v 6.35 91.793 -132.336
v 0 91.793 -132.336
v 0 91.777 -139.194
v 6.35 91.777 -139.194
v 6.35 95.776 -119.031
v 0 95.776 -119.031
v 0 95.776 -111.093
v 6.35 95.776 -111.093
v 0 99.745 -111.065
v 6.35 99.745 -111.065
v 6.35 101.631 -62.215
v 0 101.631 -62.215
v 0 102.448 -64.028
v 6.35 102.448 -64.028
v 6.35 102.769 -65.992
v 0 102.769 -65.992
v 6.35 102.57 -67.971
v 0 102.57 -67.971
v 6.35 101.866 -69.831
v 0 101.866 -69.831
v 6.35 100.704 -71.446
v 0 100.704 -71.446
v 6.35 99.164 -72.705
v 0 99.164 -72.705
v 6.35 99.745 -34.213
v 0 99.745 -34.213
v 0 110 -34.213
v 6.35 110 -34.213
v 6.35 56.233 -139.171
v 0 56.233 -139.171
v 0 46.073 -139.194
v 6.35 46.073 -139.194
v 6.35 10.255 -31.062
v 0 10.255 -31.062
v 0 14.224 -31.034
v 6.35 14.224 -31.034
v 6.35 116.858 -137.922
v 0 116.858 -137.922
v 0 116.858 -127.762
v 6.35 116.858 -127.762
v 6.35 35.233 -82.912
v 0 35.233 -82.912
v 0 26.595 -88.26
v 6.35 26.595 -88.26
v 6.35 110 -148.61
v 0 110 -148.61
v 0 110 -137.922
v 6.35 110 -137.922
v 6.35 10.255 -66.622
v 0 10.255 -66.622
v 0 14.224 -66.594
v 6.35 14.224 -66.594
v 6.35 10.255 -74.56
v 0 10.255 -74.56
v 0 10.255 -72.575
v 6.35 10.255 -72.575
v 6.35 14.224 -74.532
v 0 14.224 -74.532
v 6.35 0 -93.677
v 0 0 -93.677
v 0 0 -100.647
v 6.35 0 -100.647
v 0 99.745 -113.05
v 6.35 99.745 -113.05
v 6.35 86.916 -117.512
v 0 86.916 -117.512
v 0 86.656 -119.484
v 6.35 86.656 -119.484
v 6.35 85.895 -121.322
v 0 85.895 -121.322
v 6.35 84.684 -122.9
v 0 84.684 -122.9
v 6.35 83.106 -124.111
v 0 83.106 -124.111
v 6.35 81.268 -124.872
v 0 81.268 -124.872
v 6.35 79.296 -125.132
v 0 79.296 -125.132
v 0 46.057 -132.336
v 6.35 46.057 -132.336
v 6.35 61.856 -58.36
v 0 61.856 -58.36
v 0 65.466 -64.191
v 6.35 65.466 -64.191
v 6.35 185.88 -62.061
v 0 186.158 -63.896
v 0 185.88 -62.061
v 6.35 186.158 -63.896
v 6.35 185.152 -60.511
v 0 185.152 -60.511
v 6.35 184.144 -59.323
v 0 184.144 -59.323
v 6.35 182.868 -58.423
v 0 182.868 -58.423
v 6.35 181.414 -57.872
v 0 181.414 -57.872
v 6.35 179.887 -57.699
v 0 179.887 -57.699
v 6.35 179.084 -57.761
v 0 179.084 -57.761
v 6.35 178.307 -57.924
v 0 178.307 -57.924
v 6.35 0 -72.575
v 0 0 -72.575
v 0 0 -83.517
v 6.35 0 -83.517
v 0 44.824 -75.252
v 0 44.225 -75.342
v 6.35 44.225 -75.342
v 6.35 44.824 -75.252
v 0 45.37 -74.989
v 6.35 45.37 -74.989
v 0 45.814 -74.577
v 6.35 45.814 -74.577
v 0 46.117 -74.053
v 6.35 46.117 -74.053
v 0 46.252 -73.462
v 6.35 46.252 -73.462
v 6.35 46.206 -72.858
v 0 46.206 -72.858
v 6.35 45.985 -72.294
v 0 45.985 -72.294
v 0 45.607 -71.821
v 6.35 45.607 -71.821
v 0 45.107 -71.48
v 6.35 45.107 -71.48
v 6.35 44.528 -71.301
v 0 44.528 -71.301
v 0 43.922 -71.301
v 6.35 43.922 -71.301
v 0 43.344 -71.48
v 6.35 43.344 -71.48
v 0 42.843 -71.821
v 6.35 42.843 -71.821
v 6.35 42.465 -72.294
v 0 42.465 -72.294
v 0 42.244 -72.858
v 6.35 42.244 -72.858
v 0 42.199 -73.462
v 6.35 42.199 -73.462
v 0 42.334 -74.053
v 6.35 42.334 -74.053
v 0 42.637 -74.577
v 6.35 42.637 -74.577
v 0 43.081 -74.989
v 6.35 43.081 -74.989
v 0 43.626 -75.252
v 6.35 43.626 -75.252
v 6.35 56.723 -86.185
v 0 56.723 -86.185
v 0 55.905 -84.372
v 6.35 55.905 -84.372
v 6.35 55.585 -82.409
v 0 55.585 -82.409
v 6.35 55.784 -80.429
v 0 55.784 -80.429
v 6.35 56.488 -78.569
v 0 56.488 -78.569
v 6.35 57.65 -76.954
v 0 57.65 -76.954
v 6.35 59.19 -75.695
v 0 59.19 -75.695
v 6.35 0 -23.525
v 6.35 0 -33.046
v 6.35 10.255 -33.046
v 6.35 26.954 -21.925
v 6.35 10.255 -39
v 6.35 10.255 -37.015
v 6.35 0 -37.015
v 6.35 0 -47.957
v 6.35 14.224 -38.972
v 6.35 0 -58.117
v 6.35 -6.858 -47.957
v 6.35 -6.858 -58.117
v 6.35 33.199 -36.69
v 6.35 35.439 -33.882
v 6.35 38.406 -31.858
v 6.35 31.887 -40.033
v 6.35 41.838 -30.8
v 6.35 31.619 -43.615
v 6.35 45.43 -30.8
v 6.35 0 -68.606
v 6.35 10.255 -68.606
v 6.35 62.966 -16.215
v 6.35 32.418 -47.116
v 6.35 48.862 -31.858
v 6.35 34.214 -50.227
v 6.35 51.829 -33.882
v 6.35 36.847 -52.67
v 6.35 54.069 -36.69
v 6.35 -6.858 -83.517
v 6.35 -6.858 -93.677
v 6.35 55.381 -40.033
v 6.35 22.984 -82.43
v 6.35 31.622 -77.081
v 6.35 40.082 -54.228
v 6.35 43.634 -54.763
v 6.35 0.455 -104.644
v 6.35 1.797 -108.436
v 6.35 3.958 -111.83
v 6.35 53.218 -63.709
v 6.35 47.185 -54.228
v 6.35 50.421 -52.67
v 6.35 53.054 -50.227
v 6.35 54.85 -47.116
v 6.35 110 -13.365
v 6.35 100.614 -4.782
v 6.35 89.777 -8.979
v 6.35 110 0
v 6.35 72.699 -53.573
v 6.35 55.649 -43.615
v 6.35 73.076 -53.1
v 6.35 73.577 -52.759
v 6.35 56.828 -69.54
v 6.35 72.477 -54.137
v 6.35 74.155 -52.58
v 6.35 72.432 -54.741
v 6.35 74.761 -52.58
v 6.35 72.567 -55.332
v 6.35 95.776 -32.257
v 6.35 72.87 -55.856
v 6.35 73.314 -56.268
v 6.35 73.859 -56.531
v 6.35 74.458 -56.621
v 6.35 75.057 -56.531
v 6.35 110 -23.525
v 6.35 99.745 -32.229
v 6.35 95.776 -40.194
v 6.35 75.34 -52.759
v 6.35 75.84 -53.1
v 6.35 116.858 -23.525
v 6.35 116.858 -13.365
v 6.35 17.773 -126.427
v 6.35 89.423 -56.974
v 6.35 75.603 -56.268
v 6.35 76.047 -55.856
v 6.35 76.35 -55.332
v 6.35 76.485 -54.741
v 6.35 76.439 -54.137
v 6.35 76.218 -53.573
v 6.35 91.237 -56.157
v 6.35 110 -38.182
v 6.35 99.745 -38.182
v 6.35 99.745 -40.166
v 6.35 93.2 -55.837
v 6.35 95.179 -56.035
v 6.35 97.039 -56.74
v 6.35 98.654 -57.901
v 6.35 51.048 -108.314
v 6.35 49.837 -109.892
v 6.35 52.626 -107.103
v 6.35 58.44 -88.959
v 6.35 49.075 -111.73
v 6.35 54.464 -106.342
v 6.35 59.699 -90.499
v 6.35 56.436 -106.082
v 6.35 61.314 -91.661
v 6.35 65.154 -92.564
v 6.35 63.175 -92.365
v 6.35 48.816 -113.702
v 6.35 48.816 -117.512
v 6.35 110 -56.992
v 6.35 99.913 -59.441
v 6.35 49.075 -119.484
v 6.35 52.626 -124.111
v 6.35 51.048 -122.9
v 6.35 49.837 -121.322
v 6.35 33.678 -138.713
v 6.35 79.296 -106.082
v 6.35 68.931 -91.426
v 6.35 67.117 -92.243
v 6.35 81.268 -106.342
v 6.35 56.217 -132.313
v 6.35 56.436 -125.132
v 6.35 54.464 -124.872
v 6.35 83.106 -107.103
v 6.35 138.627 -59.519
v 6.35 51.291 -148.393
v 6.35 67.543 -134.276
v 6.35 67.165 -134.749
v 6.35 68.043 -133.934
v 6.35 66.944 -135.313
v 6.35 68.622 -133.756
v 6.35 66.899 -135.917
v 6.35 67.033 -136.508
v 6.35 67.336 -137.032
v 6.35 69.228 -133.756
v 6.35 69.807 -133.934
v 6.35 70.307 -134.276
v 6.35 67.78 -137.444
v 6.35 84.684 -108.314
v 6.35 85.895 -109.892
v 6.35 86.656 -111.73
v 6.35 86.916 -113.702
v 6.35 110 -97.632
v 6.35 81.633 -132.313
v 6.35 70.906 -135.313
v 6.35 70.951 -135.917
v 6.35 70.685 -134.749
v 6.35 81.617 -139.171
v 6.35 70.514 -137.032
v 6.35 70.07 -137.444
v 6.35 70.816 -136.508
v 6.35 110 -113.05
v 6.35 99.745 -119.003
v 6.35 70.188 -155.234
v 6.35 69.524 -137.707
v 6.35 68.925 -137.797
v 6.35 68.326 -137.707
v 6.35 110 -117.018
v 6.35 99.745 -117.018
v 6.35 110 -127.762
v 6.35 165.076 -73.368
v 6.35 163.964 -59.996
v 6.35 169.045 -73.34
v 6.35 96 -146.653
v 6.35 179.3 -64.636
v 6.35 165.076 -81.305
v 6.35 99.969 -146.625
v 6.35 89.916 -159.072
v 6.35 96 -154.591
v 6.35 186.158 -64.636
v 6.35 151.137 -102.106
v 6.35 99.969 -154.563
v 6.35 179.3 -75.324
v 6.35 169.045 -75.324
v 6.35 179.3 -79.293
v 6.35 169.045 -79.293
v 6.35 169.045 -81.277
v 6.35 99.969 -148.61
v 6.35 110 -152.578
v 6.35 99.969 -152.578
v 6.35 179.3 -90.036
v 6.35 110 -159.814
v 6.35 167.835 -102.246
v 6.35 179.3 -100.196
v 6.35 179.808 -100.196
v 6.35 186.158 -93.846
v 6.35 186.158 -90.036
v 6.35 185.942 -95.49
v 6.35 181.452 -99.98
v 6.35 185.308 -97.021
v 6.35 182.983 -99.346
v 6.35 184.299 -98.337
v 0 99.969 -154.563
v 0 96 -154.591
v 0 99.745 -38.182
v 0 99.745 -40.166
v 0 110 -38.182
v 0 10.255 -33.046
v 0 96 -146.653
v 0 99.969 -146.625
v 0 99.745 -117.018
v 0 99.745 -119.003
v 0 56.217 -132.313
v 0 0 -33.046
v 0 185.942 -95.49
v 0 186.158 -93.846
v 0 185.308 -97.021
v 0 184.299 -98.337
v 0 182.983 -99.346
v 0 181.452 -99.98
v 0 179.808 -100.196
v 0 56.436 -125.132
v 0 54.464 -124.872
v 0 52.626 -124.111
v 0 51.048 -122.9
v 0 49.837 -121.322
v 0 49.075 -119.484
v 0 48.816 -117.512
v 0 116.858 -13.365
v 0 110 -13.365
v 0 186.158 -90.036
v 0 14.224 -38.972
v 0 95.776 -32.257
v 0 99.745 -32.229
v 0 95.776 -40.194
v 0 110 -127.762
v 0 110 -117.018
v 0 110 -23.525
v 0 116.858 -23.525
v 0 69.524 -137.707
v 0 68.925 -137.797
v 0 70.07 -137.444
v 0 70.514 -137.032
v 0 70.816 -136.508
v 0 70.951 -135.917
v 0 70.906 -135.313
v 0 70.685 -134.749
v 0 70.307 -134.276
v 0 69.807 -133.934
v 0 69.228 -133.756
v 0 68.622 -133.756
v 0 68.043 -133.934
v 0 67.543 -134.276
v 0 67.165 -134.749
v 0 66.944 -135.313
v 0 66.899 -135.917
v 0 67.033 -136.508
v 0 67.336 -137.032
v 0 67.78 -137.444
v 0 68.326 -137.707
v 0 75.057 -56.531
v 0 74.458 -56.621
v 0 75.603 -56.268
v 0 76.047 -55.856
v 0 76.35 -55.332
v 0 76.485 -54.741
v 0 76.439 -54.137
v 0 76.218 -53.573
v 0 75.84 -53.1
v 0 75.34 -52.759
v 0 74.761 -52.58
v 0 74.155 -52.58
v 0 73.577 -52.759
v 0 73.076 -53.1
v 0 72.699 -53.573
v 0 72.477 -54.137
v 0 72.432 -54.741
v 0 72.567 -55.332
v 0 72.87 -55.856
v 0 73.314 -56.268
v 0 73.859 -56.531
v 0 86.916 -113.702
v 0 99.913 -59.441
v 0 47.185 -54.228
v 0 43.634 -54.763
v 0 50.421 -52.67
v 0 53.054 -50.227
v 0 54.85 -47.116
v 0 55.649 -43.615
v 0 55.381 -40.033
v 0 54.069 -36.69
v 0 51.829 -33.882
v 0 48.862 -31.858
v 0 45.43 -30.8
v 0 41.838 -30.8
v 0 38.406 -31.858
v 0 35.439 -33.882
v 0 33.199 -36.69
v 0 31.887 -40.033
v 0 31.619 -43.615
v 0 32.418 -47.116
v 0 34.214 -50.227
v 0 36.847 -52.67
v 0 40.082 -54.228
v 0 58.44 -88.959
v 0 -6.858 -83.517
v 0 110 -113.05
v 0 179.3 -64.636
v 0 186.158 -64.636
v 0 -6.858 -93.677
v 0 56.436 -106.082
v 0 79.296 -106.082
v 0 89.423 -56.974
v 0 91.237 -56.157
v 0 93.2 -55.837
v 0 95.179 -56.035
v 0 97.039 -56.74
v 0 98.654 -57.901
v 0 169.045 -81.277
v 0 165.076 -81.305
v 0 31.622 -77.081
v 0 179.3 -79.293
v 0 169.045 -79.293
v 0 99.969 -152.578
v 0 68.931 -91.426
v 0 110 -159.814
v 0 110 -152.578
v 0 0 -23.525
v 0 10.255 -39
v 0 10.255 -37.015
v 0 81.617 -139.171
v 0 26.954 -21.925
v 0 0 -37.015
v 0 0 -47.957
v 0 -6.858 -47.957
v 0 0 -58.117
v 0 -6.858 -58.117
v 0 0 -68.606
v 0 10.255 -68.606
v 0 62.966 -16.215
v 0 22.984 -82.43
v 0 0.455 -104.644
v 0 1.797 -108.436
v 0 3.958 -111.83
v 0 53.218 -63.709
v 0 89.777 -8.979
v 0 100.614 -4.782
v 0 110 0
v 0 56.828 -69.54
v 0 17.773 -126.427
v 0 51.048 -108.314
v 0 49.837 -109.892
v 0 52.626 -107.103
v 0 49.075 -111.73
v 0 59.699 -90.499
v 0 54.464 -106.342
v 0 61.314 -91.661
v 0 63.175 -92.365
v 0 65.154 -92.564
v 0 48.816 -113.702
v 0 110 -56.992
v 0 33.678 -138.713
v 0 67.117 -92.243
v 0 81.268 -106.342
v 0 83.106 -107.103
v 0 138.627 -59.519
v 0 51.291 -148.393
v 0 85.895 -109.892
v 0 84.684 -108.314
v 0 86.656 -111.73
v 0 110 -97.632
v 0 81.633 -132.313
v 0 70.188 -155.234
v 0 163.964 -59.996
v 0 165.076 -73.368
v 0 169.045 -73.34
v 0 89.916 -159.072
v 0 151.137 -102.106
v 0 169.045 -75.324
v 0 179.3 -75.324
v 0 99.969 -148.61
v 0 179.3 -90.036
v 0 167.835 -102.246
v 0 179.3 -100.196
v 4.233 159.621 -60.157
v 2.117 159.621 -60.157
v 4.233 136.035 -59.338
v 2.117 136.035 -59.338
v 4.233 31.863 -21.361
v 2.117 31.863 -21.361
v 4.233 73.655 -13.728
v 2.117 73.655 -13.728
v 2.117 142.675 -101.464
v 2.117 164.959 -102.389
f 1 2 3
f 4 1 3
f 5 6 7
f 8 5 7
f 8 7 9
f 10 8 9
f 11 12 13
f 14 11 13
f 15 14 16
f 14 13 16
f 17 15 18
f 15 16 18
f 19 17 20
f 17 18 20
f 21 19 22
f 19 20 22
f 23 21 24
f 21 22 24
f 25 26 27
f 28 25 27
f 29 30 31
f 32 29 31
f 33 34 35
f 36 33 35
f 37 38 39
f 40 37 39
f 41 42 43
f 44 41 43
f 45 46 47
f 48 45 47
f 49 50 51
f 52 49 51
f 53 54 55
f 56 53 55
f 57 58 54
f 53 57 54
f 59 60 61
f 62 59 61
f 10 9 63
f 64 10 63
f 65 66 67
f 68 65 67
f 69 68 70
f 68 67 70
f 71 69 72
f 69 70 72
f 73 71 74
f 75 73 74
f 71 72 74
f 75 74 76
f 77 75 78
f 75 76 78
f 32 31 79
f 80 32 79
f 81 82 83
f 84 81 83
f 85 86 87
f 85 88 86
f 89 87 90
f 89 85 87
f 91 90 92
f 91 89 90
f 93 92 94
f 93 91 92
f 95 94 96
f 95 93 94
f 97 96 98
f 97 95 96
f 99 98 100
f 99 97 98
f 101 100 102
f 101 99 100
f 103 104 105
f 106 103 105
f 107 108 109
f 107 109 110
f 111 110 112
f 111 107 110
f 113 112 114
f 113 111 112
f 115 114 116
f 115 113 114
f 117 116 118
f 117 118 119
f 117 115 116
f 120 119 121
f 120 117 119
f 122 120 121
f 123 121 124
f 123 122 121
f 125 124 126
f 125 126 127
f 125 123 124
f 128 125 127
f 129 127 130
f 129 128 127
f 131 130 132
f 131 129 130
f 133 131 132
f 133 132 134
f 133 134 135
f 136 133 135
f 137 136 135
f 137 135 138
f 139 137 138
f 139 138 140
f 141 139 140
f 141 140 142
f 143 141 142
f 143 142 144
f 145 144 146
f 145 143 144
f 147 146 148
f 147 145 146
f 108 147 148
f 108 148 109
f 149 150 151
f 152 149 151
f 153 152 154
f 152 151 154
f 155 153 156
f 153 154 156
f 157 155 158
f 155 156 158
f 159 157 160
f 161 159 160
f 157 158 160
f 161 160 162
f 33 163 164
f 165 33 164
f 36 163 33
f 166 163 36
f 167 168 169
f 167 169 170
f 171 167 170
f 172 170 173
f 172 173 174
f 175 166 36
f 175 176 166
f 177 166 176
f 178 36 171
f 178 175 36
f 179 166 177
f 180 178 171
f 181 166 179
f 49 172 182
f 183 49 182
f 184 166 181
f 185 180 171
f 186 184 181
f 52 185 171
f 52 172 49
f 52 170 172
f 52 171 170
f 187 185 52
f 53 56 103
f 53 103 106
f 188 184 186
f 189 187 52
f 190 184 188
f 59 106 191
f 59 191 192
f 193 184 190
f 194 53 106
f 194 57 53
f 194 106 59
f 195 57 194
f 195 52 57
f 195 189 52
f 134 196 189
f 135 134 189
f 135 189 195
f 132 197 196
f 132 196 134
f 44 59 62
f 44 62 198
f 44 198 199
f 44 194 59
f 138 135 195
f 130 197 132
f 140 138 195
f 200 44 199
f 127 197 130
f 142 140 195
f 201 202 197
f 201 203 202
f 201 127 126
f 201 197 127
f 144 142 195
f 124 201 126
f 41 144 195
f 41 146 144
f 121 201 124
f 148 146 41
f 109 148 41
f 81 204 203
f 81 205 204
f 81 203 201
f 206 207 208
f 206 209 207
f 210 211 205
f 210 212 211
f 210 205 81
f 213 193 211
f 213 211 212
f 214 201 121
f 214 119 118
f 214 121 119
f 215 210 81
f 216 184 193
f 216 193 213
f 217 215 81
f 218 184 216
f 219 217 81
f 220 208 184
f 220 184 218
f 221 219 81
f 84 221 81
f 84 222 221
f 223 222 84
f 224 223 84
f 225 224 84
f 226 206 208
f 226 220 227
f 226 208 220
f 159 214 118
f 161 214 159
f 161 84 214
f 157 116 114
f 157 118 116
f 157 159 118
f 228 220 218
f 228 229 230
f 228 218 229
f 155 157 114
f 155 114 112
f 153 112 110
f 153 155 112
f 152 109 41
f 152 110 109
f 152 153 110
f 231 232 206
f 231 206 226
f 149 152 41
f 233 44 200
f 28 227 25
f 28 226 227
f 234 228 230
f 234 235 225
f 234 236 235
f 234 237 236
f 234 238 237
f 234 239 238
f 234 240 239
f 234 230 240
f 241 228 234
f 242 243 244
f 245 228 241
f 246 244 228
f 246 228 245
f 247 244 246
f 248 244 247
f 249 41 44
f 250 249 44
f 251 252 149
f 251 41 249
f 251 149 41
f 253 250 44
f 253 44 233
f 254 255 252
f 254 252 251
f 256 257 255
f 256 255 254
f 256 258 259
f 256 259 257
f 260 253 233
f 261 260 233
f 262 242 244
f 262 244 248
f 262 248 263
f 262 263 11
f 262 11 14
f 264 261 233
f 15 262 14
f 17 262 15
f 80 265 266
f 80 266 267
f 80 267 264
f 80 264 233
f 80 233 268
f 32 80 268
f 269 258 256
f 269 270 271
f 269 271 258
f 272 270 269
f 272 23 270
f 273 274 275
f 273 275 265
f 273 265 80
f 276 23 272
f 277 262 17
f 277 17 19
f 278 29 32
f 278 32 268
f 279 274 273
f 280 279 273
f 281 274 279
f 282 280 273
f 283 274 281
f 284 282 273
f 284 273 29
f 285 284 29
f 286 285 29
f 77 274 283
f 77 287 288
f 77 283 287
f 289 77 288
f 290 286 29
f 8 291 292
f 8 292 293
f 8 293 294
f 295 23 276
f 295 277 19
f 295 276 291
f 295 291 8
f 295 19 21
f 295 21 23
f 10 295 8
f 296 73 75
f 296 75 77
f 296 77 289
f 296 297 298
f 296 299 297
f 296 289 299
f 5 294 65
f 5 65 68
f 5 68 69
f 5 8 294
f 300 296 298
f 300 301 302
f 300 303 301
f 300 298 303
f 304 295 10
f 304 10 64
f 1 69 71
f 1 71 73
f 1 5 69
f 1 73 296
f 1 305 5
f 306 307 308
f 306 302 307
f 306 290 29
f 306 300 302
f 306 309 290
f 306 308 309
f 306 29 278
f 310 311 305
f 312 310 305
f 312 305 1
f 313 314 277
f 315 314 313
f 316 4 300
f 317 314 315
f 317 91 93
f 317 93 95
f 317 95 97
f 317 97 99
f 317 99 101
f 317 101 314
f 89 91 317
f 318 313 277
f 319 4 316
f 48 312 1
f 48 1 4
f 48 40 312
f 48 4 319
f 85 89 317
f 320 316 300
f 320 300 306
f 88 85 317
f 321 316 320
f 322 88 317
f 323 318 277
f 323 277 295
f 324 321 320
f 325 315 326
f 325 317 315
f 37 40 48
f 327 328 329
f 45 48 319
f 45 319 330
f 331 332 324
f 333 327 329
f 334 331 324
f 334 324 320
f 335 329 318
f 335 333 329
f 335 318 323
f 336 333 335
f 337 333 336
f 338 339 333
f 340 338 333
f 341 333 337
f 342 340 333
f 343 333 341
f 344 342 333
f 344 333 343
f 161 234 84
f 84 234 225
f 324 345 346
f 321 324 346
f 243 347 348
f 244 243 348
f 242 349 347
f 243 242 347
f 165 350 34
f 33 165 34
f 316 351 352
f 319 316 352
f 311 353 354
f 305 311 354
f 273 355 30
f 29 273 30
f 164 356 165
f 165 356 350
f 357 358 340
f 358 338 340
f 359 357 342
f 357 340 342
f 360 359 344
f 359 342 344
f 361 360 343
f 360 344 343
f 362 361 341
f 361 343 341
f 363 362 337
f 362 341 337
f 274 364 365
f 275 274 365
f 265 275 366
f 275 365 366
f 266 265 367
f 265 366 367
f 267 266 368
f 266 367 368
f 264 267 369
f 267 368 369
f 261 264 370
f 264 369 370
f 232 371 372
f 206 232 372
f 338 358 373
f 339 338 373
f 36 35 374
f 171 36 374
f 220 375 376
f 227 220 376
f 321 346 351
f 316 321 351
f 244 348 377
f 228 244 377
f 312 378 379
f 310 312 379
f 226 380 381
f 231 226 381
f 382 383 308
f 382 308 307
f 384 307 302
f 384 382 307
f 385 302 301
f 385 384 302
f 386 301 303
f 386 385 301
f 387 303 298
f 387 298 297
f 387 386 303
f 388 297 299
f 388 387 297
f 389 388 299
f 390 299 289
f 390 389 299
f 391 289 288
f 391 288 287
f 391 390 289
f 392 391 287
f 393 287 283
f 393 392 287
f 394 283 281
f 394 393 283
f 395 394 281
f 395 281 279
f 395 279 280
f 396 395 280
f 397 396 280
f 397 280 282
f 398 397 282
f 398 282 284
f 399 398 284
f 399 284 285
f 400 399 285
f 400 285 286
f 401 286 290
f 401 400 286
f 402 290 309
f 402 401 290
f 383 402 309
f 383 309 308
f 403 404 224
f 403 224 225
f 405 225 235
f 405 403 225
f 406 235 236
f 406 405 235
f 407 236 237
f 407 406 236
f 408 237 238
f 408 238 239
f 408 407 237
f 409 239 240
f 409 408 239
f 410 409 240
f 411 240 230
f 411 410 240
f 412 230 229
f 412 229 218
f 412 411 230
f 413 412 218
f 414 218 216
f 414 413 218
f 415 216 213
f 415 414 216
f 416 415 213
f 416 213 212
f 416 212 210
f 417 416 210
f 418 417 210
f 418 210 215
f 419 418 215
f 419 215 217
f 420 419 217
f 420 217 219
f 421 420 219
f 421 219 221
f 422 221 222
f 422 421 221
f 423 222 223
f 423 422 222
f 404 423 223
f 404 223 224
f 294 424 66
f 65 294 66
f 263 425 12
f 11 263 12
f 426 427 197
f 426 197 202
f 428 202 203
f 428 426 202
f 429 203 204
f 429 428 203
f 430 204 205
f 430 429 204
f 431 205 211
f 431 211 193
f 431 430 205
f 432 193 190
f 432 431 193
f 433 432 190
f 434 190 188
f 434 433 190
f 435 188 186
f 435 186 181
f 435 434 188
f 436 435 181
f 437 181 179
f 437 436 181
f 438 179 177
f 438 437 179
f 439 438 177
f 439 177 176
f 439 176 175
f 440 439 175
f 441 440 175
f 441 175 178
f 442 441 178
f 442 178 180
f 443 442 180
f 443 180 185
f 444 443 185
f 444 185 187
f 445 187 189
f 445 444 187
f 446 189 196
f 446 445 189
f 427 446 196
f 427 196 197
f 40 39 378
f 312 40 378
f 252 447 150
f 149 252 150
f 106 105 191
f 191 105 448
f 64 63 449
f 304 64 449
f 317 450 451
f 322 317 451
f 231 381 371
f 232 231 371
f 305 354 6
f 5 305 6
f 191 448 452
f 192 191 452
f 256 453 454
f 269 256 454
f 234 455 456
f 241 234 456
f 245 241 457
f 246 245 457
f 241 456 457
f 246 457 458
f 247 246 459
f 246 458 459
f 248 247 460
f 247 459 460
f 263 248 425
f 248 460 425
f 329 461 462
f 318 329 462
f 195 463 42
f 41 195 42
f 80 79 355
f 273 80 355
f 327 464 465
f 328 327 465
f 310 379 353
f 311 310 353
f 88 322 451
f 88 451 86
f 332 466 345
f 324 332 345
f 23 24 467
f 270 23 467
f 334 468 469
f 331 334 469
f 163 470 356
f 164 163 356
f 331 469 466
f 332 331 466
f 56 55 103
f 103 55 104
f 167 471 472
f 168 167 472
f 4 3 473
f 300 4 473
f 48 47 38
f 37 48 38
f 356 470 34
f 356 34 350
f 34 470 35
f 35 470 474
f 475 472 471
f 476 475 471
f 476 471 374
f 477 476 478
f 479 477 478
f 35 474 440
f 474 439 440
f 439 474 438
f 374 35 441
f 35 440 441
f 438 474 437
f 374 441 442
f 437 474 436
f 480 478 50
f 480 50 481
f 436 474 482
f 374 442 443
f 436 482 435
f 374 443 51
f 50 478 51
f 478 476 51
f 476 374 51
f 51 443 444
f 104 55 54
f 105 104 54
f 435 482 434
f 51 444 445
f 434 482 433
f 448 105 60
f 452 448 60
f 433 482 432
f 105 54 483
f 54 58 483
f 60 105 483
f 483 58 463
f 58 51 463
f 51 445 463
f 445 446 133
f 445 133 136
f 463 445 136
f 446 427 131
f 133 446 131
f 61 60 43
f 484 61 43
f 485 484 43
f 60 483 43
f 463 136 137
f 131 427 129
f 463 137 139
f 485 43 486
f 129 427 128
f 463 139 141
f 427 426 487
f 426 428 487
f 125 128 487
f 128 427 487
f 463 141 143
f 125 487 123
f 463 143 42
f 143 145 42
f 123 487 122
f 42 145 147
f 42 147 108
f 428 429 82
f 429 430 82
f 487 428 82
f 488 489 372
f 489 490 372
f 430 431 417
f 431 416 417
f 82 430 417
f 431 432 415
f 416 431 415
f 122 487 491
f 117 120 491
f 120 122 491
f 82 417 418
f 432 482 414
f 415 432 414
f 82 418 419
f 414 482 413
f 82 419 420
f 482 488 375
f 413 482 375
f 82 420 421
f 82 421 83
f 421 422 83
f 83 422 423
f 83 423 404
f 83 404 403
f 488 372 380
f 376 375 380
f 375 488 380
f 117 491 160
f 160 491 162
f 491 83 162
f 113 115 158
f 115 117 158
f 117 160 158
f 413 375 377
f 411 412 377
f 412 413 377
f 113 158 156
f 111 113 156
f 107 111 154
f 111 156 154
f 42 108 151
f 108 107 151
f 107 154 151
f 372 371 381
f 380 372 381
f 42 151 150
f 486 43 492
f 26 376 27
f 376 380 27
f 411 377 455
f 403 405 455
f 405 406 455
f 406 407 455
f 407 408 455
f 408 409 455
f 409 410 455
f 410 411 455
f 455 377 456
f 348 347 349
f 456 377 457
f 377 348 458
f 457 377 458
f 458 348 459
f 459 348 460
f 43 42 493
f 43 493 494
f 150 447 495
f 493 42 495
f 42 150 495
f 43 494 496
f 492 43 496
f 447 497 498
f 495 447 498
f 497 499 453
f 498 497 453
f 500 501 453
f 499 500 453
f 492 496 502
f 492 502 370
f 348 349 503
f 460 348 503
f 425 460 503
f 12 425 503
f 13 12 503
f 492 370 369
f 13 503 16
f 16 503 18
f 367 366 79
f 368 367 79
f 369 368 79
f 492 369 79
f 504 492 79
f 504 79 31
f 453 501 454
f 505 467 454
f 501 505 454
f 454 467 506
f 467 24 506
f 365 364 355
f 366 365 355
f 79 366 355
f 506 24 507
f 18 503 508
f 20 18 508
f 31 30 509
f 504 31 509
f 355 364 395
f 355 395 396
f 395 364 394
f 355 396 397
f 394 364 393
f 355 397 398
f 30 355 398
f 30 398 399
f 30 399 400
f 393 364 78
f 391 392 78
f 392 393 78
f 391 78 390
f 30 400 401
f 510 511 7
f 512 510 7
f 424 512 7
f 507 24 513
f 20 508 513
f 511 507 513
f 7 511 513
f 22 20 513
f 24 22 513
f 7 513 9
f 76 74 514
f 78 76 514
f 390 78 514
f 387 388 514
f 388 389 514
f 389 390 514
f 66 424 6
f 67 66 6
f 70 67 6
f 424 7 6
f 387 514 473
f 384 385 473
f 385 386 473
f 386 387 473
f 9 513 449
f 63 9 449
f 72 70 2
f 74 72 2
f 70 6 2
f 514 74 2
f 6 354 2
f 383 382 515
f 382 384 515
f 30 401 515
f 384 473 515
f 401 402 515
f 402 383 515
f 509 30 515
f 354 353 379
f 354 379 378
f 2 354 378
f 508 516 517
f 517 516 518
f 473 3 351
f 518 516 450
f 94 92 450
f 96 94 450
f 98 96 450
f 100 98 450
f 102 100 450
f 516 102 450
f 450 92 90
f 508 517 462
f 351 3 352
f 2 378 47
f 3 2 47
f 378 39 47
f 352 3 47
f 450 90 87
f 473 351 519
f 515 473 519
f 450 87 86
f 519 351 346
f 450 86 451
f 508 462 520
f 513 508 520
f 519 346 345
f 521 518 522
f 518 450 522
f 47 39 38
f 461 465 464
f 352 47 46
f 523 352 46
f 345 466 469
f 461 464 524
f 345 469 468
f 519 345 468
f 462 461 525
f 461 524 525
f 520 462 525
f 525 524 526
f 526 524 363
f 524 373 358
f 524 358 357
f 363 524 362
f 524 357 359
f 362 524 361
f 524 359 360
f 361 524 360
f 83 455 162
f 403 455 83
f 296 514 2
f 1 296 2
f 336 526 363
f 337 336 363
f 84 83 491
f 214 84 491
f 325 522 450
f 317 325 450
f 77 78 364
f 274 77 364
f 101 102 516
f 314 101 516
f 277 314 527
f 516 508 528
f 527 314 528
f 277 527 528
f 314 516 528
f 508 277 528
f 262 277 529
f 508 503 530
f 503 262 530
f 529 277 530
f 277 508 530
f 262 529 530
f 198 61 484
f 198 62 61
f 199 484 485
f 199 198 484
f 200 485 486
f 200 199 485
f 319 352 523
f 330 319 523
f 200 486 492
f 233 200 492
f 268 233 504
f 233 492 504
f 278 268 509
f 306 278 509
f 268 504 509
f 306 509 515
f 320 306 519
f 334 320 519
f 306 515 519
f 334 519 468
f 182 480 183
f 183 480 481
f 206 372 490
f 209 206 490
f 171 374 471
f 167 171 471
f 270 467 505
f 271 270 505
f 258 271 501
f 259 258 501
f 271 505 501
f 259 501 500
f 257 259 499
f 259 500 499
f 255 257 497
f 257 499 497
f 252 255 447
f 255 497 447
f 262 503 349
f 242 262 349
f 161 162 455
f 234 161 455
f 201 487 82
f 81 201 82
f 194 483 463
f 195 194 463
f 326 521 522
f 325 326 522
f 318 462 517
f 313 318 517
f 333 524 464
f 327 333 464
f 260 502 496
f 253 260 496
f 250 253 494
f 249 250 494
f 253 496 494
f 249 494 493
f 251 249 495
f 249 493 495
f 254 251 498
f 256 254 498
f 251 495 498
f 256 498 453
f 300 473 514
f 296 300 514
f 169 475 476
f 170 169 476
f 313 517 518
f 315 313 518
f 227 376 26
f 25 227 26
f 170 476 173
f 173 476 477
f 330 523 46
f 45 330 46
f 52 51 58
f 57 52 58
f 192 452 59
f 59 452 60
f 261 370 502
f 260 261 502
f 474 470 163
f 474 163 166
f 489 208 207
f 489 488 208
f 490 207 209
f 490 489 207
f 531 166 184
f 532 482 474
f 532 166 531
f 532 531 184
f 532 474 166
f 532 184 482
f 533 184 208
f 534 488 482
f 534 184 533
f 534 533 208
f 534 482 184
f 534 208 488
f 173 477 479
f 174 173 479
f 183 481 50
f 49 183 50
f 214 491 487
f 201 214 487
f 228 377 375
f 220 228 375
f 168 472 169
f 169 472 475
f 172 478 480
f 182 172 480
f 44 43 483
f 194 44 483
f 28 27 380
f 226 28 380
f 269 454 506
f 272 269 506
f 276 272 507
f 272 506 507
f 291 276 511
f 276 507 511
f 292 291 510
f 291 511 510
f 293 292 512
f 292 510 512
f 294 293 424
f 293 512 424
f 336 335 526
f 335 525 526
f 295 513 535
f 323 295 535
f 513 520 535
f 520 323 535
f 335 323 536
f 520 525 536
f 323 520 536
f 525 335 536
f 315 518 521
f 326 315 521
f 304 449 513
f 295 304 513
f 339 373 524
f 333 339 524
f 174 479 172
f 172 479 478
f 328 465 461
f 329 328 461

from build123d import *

# Parameters (mm, degrees)
SKETCH1_R      = 12.049005967
SKETCH1_R_2    = 2.032
EXTRUDE1_DEPTH = 6.35
FILLET3_R      = 17.78
FILLET8_R      = 6.1976
FILLET10_R     = 6.35


with BuildPart() as part:
    # Sketch1 → Extrude1 (new body)
    with BuildSketch(Plane(origin=(0, 0, 0), x_dir=(0, 0, -1), z_dir=(1, 0, 0))):
        with BuildLine():
            Line((13.365344838, 110), (0, 110))
            add(Edge.make_bspline(
                [(23.525344838, 0), (23.886396453, 21.77280911), (16.984017385, 81.503501161), (0, 110)],
                knots=[0, 0, 0, 0, 1, 1, 1, 1], degree=3))
            Line((23.525344838, 0), (33.046497245, 0))
            Line((33.046497245, 0), (33.046497245, 10.25525))
            Line((33.046497245, 10.25525), (31.062122245, 10.25525))
            Line((31.062122245, 10.25525), (31.034086884, 14.224))
            Line((31.034086884, 14.224), (38.971586884, 14.224))
            Line((38.971586884, 14.224), (38.999622245, 10.25525))
            Line((38.999622245, 10.25525), (37.015247245, 10.25525))
            Line((37.015247245, 10.25525), (37.015247245, 0))
            Line((37.015247245, 0), (47.956836884, 0))
            Line((47.956836884, 0), (47.956836884, -6.858))
            Line((47.956836884, -6.858), (58.116836884, -6.858))
            Line((58.116836884, -6.858), (58.116836884, 0))
            Line((58.116836884, 0), (68.606497245, 0))
            Line((68.606497245, 0), (68.606497245, 10.25525))
            Line((68.606497245, 10.25525), (66.622122245, 10.25525))
            Line((66.622122245, 10.25525), (66.594086884, 14.224))
            Line((66.594086884, 14.224), (74.531586884, 14.224))
            Line((74.531586884, 14.224), (74.559622245, 10.25525))
            Line((74.559622245, 10.25525), (72.575247245, 10.25525))
            Line((72.575247245, 10.25525), (72.575247245, 0))
            Line((72.575247245, 0), (83.516836884, 0))
            Line((83.516836884, 0), (83.516836884, -6.858))
            Line((83.516836884, -6.858), (93.676836884, -6.858))
            Line((93.676836884, -6.858), (93.676836884, 0))
            Line((93.676836884, 0), (106.68, 0))
            ThreePointArc((106.68, 0), (147.01715629, 48.348482811), (159.813733796, 110))
            Line((159.813733796, 110), (152.578339639, 110))
            Line((152.578339639, 110), (152.578339639, 99.96875))
            Line((152.578339639, 99.96875), (154.562714639, 99.96875))
            Line((154.562714639, 99.96875), (154.59075, 96))
            Line((154.59075, 96), (146.65325, 96))
            Line((146.65325, 96), (146.625214639, 99.96875))
            Line((146.625214639, 99.96875), (148.609589639, 99.96875))
            Line((148.609589639, 99.96875), (148.609589639, 110))
            Line((148.609589639, 110), (137.922, 110))
            Line((137.922, 110), (137.922, 116.858))
            Line((137.922, 116.858), (127.762, 116.858))
            Line((127.762, 116.858), (127.762, 110))
            Line((127.762, 110), (117.018339639, 110))
            Line((117.018339639, 110), (117.018339639, 99.74475))
            Line((117.018339639, 99.74475), (119.002714639, 99.74475))
            Line((119.002714639, 99.74475), (119.03075, 95.776))
            Line((119.03075, 95.776), (111.09325, 95.776))
            Line((111.09325, 95.776), (111.065214639, 99.74475))
            Line((111.065214639, 99.74475), (113.049589639, 99.74475))
            Line((113.049589639, 99.74475), (113.049589639, 110))
            Line((113.049589639, 110), (97.632376997, 110))
            add(Edge.make_bspline(
                [(97.632376997, 110), (102.845891428, 148.686045998), (104.019096982, 168.115161248), (100.196457803, 179.300454229)],
                knots=[0.263690297, 0.263690297, 0.263690297, 0.263690297, 1, 1, 1, 1], degree=3))
            Line((100.196457803, 179.300454229), (100.196457803, 186.158454229))
            Line((100.196457803, 186.158454229), (90.036457803, 186.158454229))
            Line((90.036457803, 186.158454229), (90.036457803, 179.300454229))
            Line((90.036457803, 179.300454229), (79.292797442, 179.300454229))
            Line((79.292797442, 179.300454229), (79.292797442, 169.045204229))
            Line((79.292797442, 169.045204229), (81.277172442, 169.045204229))
            Line((81.277172442, 169.045204229), (81.305207803, 165.076454229))
            Line((81.305207803, 165.076454229), (73.367707803, 165.076454229))
            Line((73.367707803, 165.076454229), (73.339672442, 169.045204229))
            Line((73.339672442, 169.045204229), (75.324047442, 169.045204229))
            Line((75.324047442, 169.045204229), (75.324047442, 179.300454229))
            Line((75.324047442, 179.300454229), (64.636457803, 179.300454229))
            Line((64.636457803, 179.300454229), (64.636457803, 186.158454229))
            Line((64.636457803, 186.158454229), (54.476457803, 186.158454229))
            add(Edge.make_bspline(
                [(54.476457803, 186.158454229), (63.233505027, 173.481312137), (60.112941012, 141.740656068), (56.992376997, 110)],
                knots=[0, 0, 0, 0, 1, 1, 1, 1], degree=3))
            Line((56.992376997, 110), (38.181684477, 110))
            Line((38.181684477, 110), (38.181684477, 99.74475))
            Line((38.181684477, 99.74475), (40.166059477, 99.74475))
            Line((40.166059477, 99.74475), (40.194094838, 95.776))
            Line((40.194094838, 95.776), (32.256594838, 95.776))
            Line((32.256594838, 95.776), (32.228559477, 99.74475))
            Line((32.228559477, 99.74475), (34.212934477, 99.74475))
            Line((34.212934477, 99.74475), (34.212934477, 110))
            Line((34.212934477, 110), (23.525344838, 110))
            Line((23.525344838, 110), (23.525344838, 116.858))
            Line((23.525344838, 116.858), (13.365344838, 116.858))
            Line((13.365344838, 116.858), (13.365344838, 110))
        make_face()
        Polygon((77.081007641, 31.622417606), (82.911687358, 35.23286606), (88.260499882, 26.594822035), (82.429820165, 22.984373581), align=None, mode=Mode.SUBTRACT)
        with Locations((42.714261702, 43.633986225)):
            Circle(SKETCH1_R, mode=Mode.SUBTRACT)
        with Locations((73.310331844, 44.225196864)):
            Circle(SKETCH1_R_2, mode=Mode.SUBTRACT)
        Polygon((139.194257476, 46.072756303), (132.336275936, 46.056844127), (132.312702342, 56.216816779), (139.170683882, 56.232728955), align=None, mode=Mode.SUBTRACT)
        Polygon((58.360163805, 61.855571693), (64.190843522, 65.466020147), (69.539656047, 56.827976122), (63.70897633, 53.217527668), align=None, mode=Mode.SUBTRACT)
        with BuildLine():
            ThreePointArc((106.081947056, 79.295723893), (108.313793383, 84.683877565), (113.701947056, 86.915723893))
            Line((113.701947056, 86.915723893), (117.511947056, 86.915723893))
            ThreePointArc((117.511947056, 86.915723893), (122.900100729, 84.683877565), (125.131947056, 79.295723893))
            Line((125.131947056, 79.295723893), (125.131947056, 56.435723893))
            ThreePointArc((125.131947056, 56.435723893), (122.900100729, 51.04757022), (117.511947056, 48.815723893))
            Line((117.511947056, 48.815723893), (113.701947056, 48.815723893))
            ThreePointArc((113.701947056, 48.815723893), (108.313793383, 51.04757022), (106.081947056, 56.435723893))
            Line((106.081947056, 56.435723893), (106.081947056, 79.295723893))
        make_face(mode=Mode.SUBTRACT)
        with Locations((54.589488008, 74.458350952)):
            Circle(SKETCH1_R_2, mode=Mode.SUBTRACT)
        with Locations((135.765266706, 68.924861749)):
            Circle(SKETCH1_R_2, mode=Mode.SUBTRACT)
        with BuildLine():
            ThreePointArc((56.974437356, 89.423104749), (56.03531954, 95.179092566), (59.441360982, 99.913247161))
            Line((59.441360982, 99.913247161), (62.214897914, 101.630664789))
            ThreePointArc((62.214897914, 101.630664789), (67.970885731, 102.569782605), (72.705040326, 99.163741163))
            Line((72.705040326, 99.163741163), (91.425884161, 68.930587076))
            ThreePointArc((91.425884161, 68.930587076), (92.365001978, 63.174599258), (88.958960536, 58.440444664))
            Line((88.958960536, 58.440444664), (86.185423604, 56.723027036))
            ThreePointArc((86.185423604, 56.723027036), (80.429435786, 55.783909219), (75.695281192, 59.189950661))
            Line((75.695281192, 59.189950661), (56.974437356, 89.423104749))
        make_face(mode=Mode.SUBTRACT)
        Polygon((139.170683882, 81.616994542), (132.312702342, 81.632906718), (132.336275936, 91.79287937), (139.194257476, 91.776967194), align=None, mode=Mode.SUBTRACT)
    extrude(amount=EXTRUDE1_DEPTH)

    # Fillet3
    fillet3_edges = [part.edges().sort_by_distance(p)[0] for p in [
        (3.175, 0, -106.68),
    ]]
    fillet(fillet3_edges, radius=FILLET3_R)

    # Fillet8
    fillet8_edges = [part.edges().sort_by_distance(p)[0] for p in [
        (3.175, 186.158454229, -54.476457803),
    ]]
    fillet(fillet8_edges, radius=FILLET8_R)

    # Fillet10
    fillet10_edges = [part.edges().sort_by_distance(p)[0] for p in [
        (3.175, 186.158454229, -100.196457803),
    ]]
    fillet(fillet10_edges, radius=FILLET10_R)


solid = part.part
